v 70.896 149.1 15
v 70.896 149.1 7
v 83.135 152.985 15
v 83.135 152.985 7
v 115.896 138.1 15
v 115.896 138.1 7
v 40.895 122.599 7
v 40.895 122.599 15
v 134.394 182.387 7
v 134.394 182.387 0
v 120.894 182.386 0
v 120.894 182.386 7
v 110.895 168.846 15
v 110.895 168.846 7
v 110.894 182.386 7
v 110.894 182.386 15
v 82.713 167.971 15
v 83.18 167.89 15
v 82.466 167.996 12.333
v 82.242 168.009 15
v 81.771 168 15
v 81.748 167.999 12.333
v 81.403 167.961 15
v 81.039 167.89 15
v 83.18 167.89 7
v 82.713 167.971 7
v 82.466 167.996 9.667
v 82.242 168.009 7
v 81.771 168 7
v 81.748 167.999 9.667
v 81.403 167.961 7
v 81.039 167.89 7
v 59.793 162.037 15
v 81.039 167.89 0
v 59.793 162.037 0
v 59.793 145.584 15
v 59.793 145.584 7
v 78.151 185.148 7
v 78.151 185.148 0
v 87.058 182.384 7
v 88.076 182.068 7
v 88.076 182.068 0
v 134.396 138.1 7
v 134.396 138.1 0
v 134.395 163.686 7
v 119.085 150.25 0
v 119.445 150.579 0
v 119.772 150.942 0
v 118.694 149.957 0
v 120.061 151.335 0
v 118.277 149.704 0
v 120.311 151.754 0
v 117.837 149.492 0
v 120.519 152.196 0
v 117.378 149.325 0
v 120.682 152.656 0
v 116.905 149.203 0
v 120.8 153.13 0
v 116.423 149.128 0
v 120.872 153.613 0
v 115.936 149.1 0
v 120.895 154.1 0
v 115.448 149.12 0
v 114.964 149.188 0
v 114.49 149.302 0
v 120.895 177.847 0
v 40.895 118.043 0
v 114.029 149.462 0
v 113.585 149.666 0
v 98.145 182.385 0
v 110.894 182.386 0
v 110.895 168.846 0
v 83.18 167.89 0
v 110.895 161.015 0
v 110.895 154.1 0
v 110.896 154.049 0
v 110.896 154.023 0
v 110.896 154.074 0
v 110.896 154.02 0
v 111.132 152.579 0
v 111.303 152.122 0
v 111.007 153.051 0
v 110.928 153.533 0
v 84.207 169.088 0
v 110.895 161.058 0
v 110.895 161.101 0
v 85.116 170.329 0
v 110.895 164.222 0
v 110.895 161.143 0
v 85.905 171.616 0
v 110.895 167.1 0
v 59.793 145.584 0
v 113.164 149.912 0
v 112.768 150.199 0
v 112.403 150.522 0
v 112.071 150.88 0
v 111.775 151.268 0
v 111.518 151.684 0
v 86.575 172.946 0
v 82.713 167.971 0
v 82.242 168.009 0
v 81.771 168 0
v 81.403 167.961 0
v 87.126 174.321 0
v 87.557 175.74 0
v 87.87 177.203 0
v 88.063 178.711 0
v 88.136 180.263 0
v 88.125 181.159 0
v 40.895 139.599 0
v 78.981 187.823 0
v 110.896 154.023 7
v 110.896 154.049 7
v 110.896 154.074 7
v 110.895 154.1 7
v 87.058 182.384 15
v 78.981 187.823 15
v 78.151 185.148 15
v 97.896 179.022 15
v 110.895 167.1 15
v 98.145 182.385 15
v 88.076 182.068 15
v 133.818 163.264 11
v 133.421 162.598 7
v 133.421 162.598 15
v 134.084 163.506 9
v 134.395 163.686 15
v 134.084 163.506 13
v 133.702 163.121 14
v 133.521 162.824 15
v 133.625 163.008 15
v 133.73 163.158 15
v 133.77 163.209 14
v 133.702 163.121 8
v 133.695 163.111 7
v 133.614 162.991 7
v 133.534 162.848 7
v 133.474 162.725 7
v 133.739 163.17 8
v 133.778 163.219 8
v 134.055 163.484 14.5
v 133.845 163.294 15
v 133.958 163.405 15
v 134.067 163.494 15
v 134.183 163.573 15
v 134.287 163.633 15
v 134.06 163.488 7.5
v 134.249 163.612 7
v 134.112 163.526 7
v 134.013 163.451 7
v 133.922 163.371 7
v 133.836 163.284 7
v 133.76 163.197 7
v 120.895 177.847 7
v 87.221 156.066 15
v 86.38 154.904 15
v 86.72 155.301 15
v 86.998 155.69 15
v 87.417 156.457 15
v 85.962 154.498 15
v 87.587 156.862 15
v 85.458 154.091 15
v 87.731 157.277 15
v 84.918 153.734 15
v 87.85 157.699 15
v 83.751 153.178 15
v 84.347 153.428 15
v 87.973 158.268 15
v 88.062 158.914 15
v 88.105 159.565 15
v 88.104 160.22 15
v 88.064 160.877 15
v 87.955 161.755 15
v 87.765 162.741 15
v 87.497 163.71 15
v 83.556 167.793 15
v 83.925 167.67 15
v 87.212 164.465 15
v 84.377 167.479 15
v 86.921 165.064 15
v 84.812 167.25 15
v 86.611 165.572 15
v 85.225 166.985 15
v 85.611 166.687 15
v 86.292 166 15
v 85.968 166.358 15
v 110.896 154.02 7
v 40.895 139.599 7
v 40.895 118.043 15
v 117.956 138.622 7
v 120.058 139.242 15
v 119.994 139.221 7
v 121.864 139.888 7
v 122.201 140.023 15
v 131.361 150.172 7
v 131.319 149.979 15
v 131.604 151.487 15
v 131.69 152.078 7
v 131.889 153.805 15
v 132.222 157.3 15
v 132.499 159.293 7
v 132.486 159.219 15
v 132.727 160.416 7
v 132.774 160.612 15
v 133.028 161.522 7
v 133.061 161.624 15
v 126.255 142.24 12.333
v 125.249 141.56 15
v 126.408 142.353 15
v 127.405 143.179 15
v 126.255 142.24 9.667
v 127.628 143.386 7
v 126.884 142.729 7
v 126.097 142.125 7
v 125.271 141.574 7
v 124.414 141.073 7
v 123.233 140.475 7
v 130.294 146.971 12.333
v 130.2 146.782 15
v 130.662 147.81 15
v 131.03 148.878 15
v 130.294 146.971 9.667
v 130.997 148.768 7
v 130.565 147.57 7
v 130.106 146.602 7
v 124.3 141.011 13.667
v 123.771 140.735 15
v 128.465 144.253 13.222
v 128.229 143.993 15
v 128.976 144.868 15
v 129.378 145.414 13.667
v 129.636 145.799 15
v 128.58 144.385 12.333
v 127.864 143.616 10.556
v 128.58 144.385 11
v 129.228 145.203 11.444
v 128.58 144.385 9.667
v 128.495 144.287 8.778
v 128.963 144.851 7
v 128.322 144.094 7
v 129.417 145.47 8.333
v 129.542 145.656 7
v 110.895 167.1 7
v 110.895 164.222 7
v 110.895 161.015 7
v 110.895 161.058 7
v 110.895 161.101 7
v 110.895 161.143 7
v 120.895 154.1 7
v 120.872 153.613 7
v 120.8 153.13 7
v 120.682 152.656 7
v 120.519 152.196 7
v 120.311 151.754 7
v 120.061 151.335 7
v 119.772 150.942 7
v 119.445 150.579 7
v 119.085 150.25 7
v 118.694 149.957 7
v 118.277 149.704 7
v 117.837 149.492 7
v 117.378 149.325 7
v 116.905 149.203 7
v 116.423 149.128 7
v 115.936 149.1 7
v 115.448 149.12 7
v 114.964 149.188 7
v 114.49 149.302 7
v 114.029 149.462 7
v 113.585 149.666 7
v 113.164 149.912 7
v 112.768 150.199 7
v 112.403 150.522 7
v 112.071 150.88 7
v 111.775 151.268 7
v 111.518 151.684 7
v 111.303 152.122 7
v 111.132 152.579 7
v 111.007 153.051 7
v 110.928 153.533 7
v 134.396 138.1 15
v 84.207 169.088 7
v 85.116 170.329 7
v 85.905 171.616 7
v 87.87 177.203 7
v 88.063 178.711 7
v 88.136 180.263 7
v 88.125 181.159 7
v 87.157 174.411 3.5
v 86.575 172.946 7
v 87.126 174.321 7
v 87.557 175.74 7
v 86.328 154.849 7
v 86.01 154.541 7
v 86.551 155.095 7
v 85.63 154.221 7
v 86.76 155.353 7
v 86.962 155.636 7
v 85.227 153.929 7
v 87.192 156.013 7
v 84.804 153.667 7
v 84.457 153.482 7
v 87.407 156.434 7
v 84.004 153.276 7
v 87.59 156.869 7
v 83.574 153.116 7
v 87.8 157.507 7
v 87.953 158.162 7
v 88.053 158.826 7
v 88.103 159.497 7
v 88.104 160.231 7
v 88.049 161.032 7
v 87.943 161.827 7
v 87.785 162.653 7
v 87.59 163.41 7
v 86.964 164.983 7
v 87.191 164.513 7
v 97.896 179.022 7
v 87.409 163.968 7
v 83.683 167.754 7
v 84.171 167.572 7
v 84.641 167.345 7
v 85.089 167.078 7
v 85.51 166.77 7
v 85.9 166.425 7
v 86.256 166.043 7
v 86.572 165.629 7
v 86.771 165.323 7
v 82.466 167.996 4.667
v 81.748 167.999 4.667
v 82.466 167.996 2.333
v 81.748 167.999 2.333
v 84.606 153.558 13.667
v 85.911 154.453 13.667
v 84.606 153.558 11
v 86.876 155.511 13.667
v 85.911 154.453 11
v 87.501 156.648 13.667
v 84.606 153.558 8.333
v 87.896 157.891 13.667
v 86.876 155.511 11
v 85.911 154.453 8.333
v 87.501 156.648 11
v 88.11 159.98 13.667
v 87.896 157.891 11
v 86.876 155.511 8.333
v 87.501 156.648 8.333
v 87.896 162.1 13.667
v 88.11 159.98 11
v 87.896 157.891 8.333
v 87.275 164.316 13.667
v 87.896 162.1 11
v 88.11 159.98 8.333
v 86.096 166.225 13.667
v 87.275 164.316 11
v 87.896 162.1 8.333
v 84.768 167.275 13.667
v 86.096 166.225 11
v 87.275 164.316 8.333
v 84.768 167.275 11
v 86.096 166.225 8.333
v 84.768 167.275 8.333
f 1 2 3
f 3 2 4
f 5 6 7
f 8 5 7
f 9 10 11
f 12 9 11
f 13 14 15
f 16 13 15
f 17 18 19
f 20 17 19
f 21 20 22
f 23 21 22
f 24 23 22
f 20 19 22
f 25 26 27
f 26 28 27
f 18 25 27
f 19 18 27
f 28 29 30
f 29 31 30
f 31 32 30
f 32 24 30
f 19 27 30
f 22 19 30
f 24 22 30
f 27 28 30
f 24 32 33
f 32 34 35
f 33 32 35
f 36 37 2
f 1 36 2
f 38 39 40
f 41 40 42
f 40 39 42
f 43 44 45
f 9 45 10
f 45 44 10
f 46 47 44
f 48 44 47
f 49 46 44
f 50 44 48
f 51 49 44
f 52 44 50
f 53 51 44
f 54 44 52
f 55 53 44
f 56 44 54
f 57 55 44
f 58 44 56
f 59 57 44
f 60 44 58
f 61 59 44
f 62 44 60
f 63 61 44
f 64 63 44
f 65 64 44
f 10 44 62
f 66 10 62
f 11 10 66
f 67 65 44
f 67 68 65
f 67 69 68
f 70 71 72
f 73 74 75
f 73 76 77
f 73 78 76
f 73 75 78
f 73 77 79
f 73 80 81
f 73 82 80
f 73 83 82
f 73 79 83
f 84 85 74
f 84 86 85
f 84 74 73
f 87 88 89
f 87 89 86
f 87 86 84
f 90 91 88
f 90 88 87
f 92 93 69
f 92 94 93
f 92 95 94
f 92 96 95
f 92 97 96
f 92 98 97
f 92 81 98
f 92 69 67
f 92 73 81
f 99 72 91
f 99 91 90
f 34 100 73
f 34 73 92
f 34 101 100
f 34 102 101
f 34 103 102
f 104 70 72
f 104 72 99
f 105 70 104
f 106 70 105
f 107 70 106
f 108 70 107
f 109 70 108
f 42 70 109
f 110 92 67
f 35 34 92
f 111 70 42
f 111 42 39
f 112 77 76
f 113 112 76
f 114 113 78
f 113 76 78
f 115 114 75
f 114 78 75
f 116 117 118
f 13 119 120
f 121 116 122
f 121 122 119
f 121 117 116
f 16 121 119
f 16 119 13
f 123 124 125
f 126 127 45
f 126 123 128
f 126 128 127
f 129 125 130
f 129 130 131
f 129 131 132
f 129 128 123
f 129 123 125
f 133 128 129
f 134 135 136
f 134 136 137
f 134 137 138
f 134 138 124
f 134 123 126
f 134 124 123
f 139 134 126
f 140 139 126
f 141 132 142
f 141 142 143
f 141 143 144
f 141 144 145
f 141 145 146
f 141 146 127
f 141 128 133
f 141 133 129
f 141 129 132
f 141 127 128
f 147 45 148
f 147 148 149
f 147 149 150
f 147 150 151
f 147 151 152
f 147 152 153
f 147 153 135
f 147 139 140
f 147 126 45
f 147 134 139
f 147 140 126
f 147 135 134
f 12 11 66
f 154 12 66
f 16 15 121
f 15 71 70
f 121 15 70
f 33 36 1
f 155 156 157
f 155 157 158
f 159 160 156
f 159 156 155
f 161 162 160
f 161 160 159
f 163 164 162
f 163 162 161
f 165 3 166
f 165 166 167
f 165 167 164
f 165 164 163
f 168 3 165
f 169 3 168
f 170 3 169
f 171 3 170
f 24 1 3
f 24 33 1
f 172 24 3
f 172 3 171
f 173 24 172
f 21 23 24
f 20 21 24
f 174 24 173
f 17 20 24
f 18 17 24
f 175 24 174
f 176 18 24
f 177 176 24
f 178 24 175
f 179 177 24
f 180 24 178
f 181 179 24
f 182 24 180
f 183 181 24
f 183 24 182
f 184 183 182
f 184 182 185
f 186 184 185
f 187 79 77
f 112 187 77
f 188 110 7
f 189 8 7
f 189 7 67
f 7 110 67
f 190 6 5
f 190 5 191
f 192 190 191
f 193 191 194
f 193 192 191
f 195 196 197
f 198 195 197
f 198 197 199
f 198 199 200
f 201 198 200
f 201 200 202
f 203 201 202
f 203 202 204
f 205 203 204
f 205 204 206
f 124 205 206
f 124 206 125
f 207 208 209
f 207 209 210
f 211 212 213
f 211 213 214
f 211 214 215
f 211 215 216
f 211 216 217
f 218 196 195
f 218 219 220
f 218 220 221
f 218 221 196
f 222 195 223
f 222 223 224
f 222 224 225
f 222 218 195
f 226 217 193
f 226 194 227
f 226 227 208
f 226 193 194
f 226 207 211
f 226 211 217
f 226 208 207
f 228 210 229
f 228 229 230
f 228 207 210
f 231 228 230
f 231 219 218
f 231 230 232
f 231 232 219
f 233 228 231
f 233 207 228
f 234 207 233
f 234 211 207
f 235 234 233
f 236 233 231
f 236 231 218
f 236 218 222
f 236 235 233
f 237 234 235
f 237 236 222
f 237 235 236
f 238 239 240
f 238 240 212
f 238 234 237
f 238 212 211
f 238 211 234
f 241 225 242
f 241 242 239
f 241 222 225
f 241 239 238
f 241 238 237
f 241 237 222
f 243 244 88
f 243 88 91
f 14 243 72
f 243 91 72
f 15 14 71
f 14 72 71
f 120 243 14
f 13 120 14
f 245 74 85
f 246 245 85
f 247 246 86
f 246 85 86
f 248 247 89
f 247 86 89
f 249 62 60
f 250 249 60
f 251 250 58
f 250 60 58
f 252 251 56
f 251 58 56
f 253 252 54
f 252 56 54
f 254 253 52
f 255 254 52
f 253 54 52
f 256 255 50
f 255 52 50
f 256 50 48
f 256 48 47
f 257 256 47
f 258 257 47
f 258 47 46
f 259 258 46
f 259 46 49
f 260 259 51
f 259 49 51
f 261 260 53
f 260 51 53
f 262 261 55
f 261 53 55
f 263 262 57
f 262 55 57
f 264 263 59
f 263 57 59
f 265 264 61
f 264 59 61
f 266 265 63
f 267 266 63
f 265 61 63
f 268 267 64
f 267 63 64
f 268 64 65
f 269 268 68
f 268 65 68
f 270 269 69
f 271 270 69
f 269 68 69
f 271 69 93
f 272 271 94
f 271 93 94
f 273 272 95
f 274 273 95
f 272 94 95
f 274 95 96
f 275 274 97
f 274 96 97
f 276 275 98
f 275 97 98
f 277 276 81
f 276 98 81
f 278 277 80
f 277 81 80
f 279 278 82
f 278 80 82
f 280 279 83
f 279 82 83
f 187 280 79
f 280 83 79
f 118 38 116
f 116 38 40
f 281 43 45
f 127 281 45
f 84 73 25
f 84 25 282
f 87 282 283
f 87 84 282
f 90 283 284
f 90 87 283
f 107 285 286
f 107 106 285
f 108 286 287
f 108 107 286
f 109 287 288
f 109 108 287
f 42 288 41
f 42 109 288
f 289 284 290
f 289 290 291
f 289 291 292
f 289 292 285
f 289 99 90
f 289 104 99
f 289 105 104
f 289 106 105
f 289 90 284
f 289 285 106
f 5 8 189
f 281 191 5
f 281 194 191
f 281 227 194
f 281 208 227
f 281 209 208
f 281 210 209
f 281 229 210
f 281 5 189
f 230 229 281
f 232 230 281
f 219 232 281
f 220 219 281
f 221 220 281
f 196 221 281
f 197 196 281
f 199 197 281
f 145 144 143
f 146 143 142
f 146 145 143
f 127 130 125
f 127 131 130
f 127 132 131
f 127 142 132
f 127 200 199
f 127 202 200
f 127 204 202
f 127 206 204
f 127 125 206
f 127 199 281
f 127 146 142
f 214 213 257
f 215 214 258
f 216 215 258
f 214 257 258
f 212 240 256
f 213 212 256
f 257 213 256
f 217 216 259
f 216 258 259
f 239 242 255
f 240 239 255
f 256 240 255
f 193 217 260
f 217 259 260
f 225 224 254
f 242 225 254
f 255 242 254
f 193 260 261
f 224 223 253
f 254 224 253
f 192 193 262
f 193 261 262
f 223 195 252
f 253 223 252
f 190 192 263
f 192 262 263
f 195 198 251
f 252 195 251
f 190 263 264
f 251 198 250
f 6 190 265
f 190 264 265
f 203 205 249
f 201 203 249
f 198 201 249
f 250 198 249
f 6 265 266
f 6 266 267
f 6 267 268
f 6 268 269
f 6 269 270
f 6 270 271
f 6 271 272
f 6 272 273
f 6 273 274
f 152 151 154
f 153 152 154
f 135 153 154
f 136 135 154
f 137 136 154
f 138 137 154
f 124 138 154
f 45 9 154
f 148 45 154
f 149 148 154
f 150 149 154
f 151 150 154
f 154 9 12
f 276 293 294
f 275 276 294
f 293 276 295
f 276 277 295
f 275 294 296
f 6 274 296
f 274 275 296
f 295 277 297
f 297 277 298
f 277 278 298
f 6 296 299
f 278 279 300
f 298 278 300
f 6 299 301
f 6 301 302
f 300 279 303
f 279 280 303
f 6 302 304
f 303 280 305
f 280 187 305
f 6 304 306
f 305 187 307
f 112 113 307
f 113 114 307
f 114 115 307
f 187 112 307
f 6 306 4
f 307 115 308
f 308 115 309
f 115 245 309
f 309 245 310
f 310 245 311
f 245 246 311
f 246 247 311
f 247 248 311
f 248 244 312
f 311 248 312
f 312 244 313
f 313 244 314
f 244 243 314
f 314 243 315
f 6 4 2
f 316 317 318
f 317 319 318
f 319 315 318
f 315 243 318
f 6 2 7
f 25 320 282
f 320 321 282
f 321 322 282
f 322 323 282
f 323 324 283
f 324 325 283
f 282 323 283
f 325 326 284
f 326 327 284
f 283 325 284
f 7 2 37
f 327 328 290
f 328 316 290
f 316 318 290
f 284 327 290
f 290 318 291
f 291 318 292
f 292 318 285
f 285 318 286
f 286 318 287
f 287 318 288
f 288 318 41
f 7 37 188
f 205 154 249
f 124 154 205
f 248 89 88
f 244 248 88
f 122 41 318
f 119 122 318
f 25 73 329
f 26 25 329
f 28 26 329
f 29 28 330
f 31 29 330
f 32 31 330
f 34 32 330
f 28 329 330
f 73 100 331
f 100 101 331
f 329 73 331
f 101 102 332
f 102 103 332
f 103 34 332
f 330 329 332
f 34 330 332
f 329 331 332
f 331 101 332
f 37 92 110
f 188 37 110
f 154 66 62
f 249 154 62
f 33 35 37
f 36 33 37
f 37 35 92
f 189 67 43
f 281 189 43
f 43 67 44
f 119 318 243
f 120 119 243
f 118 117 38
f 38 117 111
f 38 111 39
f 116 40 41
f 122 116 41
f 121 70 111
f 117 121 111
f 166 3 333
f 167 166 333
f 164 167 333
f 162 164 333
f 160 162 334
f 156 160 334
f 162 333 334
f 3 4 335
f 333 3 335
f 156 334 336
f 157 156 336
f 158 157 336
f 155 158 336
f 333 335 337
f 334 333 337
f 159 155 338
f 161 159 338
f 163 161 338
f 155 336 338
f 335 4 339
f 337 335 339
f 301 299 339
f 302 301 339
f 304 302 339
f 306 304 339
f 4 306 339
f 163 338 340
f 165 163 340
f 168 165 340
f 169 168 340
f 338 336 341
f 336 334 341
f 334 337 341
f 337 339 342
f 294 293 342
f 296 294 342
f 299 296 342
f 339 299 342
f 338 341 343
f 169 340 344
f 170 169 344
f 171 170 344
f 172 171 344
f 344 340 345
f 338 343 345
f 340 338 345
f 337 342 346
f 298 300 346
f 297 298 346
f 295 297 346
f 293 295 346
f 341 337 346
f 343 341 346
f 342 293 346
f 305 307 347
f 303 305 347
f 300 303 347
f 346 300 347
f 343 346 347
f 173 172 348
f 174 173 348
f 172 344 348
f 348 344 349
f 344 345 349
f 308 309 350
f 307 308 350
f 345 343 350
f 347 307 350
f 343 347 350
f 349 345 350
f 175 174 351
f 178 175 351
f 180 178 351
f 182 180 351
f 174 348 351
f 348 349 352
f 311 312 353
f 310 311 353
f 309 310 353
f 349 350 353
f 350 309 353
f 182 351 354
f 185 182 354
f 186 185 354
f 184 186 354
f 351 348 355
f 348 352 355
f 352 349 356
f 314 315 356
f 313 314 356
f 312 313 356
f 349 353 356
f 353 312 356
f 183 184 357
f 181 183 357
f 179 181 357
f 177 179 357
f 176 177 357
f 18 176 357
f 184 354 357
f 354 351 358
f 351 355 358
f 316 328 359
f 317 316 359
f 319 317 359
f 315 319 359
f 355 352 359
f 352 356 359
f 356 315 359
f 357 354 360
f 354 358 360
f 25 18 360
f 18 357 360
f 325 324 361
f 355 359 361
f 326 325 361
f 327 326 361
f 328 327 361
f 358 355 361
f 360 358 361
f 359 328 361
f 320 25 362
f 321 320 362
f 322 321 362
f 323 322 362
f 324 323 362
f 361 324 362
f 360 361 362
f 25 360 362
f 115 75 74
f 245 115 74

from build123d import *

# Parameters (mm, degrees)
BOSS_EXTRUDE1_DEPTH = 7
BOSS_EXTRUDE3_DEPTH = 15


# Read off the part's stored shape, not the designer's step: Boss-Extrude1
with BuildPart() as part:
    # Boss-Extrude1 outline → Boss-Extrude1 (new body)
    with BuildSketch(Plane.XY):
        with BuildLine():
            add(Edge.make_bspline(
                [(83.179707937, 167.890249892), (88.68617922, 173.842337038), (88.076413708, 182.068482243)],
                knots=[0, 0, 0, 1, 1, 1], degree=2))
            add(Edge.make_bspline(
                [(83.179707937, 167.890249892), (82.472579462, 168.045621317), (81.739782997, 168.056822807), (81.038915385, 167.890249892)],
                knots=[0.899910496, 0.899910496, 0.899910496, 0.899910496, 1, 1, 1, 1], degree=3))
            Line((81.038915385, 167.890249892), (59.792534645, 162.03653789))
            Line((59.792534645, 162.03653789), (59.792534645, 145.583851284))
            Line((59.792534645, 145.583851284), (40.895456025, 139.599456998))
            Line((40.895456025, 139.599456998), (40.895456025, 118.042870489))
            Line((40.895456025, 118.042870489), (134.396295865, 138.100245442))
            Line((134.396295865, 138.100245442), (134.393693517, 182.387043765))
            Line((134.393693517, 182.387043765), (120.894388682, 182.386250529))
            Line((120.894388682, 182.386250529), (120.894655408, 177.847108131))
            Line((120.894655408, 177.847108131), (120.895456025, 177.847108131))
            Line((120.895456025, 177.847108131), (120.895456025, 154.100245399))
            ThreePointArc((120.895456025, 154.100245399), (115.9356337, 149.100406826), (110.896101724, 154.019892645))
            Line((110.896101724, 154.019892645), (110.896055334, 154.022832661))
            ThreePointArc((110.896055334, 154.022832661), (110.895605855, 154.06153787), (110.895456025, 154.100245399))
            Line((110.895456025, 154.100245399), (110.895456025, 161.015247015))
            ThreePointArc((110.895456025, 161.015247015), (110.895045928, 161.07928452), (110.895456025, 161.143322025))
            Line((110.895456025, 161.143322025), (110.895456025, 164.221886849))
            Line((110.895456025, 164.221886849), (110.894388699, 182.385662916))
            Line((110.894388699, 182.385662916), (98.145136748, 182.384913754))
            Line((98.145136748, 182.384913754), (78.980988049, 187.822713754))
            Line((78.980988049, 187.822713754), (78.151089215, 185.147538204))
            Line((78.151089215, 185.147538204), (88.076413708, 182.068482243))
        make_face()
    extrude(amount=BOSS_EXTRUDE1_DEPTH)

    # Sketch2<5> → Boss-Extrude3 (add)
    with BuildSketch(Plane.XY):
        Polygon((87.058497999, 182.38426229), (98.145136748, 182.384913754), (78.980988049, 187.822713754), (78.151089215, 185.147538204), align=None)
        Polygon((97.8963446, 179.022069051), (110.895286898, 167.10010673), (110.895184282, 168.846419808), (110.894388699, 182.385662916), (98.145136748, 182.384913754), (87.058497999, 182.38426229), (88.076413708, 182.068482243), align=None)
        with BuildLine():
            add(Edge.make_bspline(
                [(83.134894854, 152.985445474), (84.153265888, 153.250657791), (85.549452344, 153.989195137), (87.192525807, 155.758725734), (88.24110083, 158.391839128), (88.095392567, 162.20289978), (86.73683171, 166.246070864), (84.288905188, 167.646535258), (83.179707937, 167.890249892)],
                knots=[0, 0, 0, 0, 0.147705893, 0.214614821, 0.335693148, 0.532502628, 0.742910733, 0.899910496, 0.899910496, 0.899910496, 0.899910496], degree=3))
            add(Edge.make_bspline(
                [(83.179707937, 167.890249892), (82.472579462, 168.045621317), (81.739782997, 168.056822807), (81.038915385, 167.890249892)],
                knots=[0.899910496, 0.899910496, 0.899910496, 0.899910496, 1, 1, 1, 1], degree=3))
            Line((81.038915385, 167.890249892), (59.792534645, 162.03653789))
            Line((59.792534645, 162.03653789), (59.792534645, 145.583851284))
            Line((59.792534645, 145.583851284), (70.8963446, 149.100245442))
            Line((70.8963446, 149.100245442), (83.134894854, 152.985445474))
        make_face()
        with BuildLine():
            Line((134.396295865, 138.100245442), (134.394792427, 163.685781747))
            add(Edge.make_bspline(
                [(133.42138155, 162.598444875), (133.72729857, 163.386688135), (134.394792427, 163.685781747)],
                knots=[0, 0, 0, 0.668506509, 0.668506509, 0.668506509], degree=2))
            add(Edge.make_bspline(
                [(115.8963446, 138.100245442), (119.177270844, 138.889647711), (125.41355503, 140.587971019), (133.049150273, 149.2867081), (131.448441996, 157.912006128), (133.42138155, 162.598444875)],
                knots=[0, 0, 0, 0, 0.334742766, 0.521400868, 1, 1, 1, 1], degree=3))
            Line((115.8963446, 138.100245442), (40.895456025, 122.599456998))
            Line((40.895456025, 122.599456998), (40.895456025, 118.042870489))
            Line((40.895456025, 118.042870489), (134.396295865, 138.100245442))
        make_face()
    extrude(amount=BOSS_EXTRUDE3_DEPTH)


solid = part.part
